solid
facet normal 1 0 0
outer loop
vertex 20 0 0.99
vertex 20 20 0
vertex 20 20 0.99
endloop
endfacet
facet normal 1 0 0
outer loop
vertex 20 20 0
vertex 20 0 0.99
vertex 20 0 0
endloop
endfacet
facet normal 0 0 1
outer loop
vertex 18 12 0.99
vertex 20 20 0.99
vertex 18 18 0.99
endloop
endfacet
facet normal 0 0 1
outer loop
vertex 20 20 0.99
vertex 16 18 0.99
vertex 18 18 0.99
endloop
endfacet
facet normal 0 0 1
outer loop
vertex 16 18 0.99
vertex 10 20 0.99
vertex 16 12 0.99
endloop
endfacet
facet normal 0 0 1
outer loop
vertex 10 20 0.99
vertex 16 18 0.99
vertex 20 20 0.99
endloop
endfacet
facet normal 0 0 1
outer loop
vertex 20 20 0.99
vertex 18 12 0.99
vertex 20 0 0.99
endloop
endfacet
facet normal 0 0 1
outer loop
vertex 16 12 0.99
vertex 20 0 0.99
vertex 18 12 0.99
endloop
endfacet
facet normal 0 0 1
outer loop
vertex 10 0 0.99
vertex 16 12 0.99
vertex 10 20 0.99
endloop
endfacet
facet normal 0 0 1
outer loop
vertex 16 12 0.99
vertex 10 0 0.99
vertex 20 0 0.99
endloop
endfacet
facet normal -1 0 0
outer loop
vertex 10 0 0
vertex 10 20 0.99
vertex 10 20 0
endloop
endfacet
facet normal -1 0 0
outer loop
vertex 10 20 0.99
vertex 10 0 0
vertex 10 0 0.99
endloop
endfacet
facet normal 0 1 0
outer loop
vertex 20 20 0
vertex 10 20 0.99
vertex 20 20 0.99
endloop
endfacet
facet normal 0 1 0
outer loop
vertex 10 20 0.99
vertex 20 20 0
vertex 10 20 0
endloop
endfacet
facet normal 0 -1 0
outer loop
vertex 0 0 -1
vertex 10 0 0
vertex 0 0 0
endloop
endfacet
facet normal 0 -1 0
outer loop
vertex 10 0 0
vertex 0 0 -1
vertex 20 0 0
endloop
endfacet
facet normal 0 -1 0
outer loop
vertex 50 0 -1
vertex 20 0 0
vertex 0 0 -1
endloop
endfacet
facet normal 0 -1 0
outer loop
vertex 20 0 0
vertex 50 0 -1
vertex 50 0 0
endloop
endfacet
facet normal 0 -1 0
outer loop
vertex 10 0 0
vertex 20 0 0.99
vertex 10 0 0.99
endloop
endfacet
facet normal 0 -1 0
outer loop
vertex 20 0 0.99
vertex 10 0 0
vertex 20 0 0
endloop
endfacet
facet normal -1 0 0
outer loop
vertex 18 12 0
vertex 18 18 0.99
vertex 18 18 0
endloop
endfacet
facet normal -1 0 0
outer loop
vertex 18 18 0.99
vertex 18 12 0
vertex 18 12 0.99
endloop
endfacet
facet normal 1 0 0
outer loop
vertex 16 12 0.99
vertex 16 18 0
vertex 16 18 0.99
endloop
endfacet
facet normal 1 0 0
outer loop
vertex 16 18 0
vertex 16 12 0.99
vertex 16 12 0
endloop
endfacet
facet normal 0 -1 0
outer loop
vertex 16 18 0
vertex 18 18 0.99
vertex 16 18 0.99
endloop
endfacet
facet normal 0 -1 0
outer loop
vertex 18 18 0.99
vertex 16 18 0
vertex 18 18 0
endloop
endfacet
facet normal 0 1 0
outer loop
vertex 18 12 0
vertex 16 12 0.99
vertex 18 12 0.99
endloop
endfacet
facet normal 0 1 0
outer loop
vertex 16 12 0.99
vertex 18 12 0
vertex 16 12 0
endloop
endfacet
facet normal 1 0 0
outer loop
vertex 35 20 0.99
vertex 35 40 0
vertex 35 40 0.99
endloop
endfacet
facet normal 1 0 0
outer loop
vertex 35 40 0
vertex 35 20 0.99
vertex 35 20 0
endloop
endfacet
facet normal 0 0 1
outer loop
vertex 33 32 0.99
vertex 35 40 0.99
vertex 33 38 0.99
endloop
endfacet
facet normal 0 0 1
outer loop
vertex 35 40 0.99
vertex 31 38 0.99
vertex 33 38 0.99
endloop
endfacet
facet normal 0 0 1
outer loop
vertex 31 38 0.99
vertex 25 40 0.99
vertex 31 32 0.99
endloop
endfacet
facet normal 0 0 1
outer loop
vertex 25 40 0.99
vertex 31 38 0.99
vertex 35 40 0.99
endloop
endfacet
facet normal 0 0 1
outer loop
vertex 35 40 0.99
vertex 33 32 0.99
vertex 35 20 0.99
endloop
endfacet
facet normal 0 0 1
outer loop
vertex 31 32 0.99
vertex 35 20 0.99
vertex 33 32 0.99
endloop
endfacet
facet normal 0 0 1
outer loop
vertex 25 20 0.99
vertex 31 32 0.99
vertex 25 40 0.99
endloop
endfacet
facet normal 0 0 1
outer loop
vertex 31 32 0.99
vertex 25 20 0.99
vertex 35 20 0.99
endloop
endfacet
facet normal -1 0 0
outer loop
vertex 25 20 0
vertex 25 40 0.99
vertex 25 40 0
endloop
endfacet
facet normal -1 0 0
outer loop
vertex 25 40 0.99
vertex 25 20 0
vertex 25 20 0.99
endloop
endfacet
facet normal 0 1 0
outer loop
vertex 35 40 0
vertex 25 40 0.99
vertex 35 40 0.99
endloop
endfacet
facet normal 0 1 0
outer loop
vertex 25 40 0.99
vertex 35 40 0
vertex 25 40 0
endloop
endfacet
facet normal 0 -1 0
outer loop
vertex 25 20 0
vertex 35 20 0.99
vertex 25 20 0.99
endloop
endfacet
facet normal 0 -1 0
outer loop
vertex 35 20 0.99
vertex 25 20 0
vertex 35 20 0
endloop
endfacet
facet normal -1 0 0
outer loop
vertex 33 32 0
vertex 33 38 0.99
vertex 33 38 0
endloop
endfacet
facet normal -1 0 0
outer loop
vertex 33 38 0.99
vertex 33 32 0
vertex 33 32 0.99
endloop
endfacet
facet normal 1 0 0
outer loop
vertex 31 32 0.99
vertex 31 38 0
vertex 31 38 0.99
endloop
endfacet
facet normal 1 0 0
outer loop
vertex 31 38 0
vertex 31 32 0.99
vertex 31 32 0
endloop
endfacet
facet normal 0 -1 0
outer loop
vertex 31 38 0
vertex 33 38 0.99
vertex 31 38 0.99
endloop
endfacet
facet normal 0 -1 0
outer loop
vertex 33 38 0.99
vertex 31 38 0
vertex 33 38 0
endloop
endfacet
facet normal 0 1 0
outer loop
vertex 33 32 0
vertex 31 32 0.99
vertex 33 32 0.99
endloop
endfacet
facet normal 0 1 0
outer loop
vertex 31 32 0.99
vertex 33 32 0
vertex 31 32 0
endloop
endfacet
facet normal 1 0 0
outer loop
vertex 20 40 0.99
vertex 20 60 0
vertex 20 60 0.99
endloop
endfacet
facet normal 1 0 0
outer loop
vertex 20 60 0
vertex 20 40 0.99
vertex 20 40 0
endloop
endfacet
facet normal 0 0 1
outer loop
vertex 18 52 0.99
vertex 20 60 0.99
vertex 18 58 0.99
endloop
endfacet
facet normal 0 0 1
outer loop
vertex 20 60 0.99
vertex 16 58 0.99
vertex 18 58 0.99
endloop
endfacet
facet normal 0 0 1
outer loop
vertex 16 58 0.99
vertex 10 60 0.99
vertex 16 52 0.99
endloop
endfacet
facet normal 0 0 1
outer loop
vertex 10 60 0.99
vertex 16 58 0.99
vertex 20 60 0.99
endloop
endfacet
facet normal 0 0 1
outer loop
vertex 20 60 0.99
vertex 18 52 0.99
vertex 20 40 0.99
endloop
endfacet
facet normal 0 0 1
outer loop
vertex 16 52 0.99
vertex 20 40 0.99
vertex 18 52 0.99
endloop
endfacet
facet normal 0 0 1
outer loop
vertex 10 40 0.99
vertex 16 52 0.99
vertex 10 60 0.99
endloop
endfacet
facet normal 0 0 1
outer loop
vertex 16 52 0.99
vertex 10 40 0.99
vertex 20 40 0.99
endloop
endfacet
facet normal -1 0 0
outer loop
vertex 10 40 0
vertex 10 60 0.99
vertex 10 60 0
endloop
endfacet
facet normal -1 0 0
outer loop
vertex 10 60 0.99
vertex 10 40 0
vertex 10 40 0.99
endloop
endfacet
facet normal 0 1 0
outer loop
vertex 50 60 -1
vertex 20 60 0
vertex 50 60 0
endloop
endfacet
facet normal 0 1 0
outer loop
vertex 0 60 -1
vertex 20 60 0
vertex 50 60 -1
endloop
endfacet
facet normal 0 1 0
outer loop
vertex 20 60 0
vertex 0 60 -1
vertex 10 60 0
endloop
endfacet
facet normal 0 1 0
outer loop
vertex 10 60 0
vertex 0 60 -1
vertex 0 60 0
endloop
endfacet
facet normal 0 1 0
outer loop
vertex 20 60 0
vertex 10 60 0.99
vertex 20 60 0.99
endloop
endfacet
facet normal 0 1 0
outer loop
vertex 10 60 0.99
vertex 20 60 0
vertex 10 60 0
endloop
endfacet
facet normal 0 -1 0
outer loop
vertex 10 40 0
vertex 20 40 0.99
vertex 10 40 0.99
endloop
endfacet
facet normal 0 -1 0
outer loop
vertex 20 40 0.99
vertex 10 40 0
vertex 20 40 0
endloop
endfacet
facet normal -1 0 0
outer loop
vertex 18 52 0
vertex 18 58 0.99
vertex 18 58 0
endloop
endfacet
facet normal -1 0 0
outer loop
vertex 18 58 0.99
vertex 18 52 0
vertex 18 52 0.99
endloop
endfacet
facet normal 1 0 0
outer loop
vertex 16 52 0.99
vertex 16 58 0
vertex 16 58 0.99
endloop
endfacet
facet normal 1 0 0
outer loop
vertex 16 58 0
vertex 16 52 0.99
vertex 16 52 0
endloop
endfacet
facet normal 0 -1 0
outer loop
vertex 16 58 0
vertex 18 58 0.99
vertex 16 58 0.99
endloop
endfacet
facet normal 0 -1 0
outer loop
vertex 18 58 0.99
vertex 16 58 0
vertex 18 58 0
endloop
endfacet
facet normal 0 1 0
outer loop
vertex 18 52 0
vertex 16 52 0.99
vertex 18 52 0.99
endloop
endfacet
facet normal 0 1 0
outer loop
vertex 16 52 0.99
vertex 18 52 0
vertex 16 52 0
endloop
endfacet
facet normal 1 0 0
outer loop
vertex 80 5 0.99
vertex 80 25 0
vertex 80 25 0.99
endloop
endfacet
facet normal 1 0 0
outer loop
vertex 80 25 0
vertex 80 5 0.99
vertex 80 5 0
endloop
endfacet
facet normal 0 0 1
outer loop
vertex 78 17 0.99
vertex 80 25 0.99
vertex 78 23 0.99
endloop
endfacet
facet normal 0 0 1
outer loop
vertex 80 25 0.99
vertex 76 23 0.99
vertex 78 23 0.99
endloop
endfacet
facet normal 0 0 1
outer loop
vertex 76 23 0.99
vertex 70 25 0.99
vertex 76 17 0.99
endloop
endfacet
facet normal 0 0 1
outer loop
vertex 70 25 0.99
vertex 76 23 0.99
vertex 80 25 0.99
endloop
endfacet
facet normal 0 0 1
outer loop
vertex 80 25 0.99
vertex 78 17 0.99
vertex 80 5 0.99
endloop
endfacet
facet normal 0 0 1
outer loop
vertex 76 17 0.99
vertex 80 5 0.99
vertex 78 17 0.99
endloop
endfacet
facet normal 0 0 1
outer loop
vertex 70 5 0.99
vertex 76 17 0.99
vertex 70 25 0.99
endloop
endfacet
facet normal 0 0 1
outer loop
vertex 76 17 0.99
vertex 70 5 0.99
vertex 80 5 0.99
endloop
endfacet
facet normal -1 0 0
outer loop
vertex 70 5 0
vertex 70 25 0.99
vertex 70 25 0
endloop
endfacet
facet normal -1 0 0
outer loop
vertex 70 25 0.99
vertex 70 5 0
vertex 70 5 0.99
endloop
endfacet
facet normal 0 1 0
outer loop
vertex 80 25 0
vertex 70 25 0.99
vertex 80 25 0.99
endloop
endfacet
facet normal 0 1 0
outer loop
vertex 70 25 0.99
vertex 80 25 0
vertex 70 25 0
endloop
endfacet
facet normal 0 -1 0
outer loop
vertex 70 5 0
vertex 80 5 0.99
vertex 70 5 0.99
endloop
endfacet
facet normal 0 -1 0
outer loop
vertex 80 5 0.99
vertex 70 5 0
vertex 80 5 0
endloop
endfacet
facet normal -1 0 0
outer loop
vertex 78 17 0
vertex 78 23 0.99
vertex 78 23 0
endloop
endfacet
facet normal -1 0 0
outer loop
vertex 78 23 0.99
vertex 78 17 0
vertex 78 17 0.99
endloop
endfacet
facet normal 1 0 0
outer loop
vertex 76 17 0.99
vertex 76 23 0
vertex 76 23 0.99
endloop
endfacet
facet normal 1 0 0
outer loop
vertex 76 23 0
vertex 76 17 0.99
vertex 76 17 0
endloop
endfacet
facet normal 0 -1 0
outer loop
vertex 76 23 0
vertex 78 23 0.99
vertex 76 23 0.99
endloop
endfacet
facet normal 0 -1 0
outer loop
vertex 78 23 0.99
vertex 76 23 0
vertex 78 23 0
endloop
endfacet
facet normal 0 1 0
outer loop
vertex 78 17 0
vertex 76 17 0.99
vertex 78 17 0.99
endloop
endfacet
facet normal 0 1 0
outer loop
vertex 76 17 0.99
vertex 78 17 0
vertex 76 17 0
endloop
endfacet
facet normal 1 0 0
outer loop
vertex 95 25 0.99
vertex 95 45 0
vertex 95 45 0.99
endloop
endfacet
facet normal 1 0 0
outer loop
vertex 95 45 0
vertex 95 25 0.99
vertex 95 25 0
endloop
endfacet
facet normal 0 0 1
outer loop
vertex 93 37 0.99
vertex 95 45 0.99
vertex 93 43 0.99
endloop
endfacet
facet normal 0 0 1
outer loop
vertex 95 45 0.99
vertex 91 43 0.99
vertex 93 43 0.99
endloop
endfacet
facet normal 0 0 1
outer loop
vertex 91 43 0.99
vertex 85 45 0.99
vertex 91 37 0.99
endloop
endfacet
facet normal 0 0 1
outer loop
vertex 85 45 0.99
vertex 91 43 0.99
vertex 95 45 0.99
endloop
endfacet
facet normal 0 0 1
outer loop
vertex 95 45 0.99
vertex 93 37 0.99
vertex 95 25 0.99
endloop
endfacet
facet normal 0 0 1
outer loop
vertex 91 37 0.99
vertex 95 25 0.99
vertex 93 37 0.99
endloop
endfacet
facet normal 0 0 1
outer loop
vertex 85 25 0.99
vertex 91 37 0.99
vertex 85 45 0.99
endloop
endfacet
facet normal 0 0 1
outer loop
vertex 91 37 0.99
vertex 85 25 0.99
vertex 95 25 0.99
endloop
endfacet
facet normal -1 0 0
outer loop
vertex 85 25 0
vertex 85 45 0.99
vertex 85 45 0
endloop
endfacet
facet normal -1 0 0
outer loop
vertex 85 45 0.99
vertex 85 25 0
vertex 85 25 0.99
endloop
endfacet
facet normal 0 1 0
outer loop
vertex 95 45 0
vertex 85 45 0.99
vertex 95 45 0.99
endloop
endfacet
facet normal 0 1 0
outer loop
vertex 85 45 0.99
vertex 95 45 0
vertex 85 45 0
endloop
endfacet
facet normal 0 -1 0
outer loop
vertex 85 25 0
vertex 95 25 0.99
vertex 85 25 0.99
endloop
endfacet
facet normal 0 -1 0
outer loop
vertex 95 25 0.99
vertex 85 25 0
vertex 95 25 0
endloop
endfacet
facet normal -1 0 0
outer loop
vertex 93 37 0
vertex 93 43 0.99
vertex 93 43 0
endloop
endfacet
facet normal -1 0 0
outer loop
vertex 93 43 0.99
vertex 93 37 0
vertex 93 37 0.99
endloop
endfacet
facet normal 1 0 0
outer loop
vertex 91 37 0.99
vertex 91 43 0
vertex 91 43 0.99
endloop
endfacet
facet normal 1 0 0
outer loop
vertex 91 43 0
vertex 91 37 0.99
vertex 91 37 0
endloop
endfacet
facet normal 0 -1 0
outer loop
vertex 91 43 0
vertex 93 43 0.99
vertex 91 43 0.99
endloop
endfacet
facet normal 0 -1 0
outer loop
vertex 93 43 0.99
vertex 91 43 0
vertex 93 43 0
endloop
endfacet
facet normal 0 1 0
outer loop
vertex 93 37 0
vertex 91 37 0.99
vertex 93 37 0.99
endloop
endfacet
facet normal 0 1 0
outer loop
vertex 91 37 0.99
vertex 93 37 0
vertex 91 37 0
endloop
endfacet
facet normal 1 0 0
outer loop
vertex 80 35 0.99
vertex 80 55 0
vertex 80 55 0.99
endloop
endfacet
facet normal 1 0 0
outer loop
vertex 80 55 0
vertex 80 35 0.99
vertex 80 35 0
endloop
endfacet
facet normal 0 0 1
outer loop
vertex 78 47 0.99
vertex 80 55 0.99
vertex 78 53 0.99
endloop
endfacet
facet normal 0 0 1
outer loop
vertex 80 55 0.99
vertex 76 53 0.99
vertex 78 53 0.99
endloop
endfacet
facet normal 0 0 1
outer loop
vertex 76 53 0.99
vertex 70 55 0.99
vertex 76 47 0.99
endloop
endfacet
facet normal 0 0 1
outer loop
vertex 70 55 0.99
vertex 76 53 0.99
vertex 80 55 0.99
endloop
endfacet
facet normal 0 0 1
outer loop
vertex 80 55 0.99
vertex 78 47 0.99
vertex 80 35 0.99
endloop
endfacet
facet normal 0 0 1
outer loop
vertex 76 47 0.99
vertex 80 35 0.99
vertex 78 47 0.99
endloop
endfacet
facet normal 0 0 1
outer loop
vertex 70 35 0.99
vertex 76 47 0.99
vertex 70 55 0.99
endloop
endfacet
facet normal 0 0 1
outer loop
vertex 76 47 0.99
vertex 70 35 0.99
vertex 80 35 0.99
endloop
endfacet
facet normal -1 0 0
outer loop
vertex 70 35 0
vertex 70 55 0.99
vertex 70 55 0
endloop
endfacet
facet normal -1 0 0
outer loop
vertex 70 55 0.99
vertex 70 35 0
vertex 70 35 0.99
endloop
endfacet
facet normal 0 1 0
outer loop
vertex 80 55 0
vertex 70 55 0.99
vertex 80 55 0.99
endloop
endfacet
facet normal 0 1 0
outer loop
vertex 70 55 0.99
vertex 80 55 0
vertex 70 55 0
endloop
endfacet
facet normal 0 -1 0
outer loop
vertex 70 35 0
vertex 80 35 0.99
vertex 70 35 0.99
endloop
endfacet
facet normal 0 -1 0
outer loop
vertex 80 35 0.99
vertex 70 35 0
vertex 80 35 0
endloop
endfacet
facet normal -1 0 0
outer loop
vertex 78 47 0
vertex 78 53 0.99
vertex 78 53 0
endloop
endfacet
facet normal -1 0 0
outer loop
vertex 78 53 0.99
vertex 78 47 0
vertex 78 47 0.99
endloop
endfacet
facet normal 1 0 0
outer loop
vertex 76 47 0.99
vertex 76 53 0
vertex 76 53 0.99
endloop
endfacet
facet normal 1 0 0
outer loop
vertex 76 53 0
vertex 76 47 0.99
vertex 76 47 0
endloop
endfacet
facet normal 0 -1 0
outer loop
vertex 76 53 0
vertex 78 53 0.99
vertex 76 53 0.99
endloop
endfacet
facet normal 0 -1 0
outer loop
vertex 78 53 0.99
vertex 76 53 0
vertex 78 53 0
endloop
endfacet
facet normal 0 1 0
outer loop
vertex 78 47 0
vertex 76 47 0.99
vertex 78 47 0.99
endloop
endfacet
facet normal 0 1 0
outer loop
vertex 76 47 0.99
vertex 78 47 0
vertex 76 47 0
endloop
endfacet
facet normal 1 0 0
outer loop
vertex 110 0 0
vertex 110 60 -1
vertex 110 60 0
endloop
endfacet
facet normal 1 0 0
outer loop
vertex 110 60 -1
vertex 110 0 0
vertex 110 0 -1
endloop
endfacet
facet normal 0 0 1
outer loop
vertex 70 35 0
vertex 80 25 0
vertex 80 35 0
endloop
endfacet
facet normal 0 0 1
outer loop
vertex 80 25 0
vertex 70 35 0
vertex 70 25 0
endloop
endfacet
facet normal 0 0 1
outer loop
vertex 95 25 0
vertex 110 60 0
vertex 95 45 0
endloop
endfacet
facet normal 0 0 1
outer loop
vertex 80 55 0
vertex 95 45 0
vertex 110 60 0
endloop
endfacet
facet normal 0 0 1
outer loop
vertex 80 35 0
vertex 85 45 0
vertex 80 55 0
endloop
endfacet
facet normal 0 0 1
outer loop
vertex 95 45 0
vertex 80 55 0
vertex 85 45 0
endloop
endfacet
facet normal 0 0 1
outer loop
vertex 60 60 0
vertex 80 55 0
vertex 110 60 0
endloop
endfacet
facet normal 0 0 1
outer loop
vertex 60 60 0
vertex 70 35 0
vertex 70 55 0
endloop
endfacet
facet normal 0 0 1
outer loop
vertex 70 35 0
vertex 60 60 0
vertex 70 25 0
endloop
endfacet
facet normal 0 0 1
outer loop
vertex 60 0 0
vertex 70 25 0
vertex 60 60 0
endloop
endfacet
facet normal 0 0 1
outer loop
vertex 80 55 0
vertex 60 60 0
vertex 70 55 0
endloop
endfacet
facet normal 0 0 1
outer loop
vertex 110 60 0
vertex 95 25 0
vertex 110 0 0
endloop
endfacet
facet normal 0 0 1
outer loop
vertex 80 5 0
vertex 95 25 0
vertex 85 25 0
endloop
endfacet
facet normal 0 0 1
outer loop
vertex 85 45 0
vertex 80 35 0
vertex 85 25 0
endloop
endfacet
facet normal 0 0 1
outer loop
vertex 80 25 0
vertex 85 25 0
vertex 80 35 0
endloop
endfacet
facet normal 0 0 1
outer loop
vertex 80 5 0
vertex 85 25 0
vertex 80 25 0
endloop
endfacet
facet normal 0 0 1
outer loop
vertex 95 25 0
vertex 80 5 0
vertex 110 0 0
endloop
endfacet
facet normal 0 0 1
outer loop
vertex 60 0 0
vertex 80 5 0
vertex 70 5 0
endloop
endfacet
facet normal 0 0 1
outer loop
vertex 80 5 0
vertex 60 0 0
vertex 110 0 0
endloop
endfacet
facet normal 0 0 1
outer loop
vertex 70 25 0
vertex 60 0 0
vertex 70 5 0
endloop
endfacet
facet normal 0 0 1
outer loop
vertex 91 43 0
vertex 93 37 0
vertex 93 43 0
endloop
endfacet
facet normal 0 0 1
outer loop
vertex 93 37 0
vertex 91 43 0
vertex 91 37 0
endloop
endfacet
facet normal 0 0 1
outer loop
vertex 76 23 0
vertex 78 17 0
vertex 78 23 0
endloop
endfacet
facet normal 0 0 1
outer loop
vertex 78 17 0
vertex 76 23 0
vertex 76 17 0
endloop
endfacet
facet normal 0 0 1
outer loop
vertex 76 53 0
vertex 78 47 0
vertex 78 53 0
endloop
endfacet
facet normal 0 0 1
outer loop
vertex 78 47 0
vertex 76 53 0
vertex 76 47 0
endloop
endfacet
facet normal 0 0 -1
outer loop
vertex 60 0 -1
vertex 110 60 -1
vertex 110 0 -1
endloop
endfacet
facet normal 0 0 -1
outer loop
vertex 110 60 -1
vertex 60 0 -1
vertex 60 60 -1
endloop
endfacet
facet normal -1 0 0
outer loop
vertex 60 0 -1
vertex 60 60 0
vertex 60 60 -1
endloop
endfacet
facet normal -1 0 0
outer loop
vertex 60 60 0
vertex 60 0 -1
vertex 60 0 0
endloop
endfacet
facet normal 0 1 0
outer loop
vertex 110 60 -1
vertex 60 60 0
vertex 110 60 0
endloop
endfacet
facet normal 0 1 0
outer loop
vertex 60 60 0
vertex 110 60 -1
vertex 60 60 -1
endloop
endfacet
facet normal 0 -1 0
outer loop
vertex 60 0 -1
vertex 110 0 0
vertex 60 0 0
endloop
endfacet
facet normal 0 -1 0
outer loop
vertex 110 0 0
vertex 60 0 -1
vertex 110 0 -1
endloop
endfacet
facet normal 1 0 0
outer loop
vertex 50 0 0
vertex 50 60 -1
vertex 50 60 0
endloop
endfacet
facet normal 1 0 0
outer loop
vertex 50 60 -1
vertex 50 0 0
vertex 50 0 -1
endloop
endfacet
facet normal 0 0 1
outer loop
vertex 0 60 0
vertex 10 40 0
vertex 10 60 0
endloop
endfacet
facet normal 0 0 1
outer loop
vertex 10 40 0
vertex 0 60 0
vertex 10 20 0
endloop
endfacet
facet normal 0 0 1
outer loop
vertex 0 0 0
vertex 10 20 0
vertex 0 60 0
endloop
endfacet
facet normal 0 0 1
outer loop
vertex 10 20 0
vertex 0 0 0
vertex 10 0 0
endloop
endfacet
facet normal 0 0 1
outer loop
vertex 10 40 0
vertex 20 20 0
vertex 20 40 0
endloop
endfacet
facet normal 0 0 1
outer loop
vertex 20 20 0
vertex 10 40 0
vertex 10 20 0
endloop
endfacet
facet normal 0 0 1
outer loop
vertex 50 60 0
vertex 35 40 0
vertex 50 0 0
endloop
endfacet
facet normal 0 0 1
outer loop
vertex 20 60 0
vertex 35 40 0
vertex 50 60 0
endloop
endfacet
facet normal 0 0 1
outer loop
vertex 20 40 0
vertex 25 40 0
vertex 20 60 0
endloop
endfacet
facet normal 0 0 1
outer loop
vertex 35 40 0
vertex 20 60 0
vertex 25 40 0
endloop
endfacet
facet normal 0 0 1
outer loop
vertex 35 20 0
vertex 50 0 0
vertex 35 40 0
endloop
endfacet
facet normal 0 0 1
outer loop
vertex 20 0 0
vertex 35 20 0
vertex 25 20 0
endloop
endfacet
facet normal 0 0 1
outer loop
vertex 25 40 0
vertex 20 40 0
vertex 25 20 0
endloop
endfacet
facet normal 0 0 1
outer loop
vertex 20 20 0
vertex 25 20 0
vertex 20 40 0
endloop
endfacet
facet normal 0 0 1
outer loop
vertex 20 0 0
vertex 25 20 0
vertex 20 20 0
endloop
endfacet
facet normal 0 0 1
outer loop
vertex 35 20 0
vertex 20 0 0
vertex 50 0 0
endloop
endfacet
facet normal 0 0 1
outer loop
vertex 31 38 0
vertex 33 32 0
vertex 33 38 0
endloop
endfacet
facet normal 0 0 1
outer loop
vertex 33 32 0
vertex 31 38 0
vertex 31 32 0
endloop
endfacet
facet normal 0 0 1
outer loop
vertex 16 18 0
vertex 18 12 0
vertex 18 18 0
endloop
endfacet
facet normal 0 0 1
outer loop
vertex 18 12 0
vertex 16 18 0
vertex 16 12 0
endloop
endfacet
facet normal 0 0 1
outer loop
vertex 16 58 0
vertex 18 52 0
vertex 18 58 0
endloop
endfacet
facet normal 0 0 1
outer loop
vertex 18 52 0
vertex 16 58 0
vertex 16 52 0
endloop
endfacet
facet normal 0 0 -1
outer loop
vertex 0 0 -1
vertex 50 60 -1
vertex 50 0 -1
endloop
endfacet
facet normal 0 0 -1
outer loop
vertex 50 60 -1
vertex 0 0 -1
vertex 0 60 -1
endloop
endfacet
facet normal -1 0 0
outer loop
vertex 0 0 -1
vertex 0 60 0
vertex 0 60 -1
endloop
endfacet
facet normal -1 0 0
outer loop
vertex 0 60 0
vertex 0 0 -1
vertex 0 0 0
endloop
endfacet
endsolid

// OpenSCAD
// file: ../TestHelper.scad
// Fischertechnik Box Foundation
// Test Helper

function getPlacementBaseSpace() = [50,60];
function getCubeSpace() = [10,20];

module PlacementBase() {
    color("green")
    translate([0, 0, -1])
        cube([getPlacementBaseSpace().x, getPlacementBaseSpace().y, 1]);
}

module Cube() {
    translate([0,0,-.01])
    difference() {
        cube([getCubeSpace().x,getCubeSpace().y,1]);
        translate([getCubeSpace().x*0.6, getCubeSpace().y*0.6, -1])
            cube([getCubeSpace().x*0.2,getCubeSpace().y*0.3,3]);
    }
}

module Deploy(distance=30) {
    for( i = [0:1:$children-1])
        translate([i*distance, 0])
            children(i);
}
// file: ../../Base/PlacementOptions.scad
// Fischertechnik Box Foundation
// Placement Options

// Alignment
NoAlign = 0;
AlignLeft = 1;
AlignBottom = 2;
AlignCenter = 3;
AlignRight = 4;
AlignTop = 5;

// Element rotation degree steps
rotations = [0, -90, -180, -270];

// Rotation
NoRotation = 0;
Rotate0 = 0;
Rotate90 = 1;
Rotate180 = 2;
Rotate270 = 3;

// Docking (seen from above)
NoDock = -1;
DockLeft = 0;
DockTop = 1;
DockRight = 2;
DockCorner = 2;
DockBottom = 3;

// Web corners
LowerLeft = 0;
UpperLeft = 1;
UpperRight = 2;
LowerRight = 3;

// Web position relative to corner
LeftOfCorner = 0;
RightOfCorner = 1;
// file: ../../Base/Alignment.scad
// Fischertechnik Box Foundation
// Geometry Helpers Alignment

include <PlacementOptions.scad>

// getAlignedX(elementWidth, spaceWidth, align=AlignRight, offset=0)
// Gets the aligned X offset of an element with the given
// width in the given space.
// elementWidth = The width of the element to positon
// spaceWidth = The space where the element should be aligned
// align = 0 AlignLeft, 1 AlignCenter, 2 AlignRight
// offset = an optional offset from the aligned position. When
// aligned left or centered, then positive values are in X direction.
// When aligned right then positive values are in negative X direction.

function getAlignedX(elementWidth, spaceWidth, align=AlignRight, offset=0) =
    (align == AlignLeft) ?
        offset :
        ((align == AlignCenter) ?
        (spaceWidth - elementWidth)/2 + offset :
        spaceWidth - offset - elementWidth);

// getAlignedY(elementDepth, spaceDepth, align=AlignTop, offset=0)
// Gets the aligned Y offset of an element with the given
// depth in the given space.
// elementDepth = The depth of the element to positon
// spaceDepth = The space where the element should be aligned
// align = 0 AlignBottom, 1 AlignCenter, 2 AlignTop
// offset = an optional offset from the aligned position. When
// aligned bottom or centered, then positive values are in Y direction.
// When aligned top then positive values are in negative Y direction.

function getAlignedY(elementDepth, spaceDepth, align=AlignTop, offset=0) =
    (align == AlignBottom) ?
        offset :
        ((align == AlignCenter) ?
        (spaceDepth - elementDepth)/2 + offset :
        spaceDepth - offset - elementDepth);
// main file
// Fischertechnik Box Foundation
// Geometry Helpers Alignment
// Test getAlignedY

use <../../Base/Alignment.scad>

include <../../Base/PlacementOptions.scad>

use <../TestHelper.scad>

PlacementBase();
bottomOffset = getAlignedY(getCubeSpace().y, getPlacementBaseSpace().y, AlignBottom);
translate([10, bottomOffset, 0])
    Cube();

centerOffset = getAlignedY(getCubeSpace().y, getPlacementBaseSpace().y, AlignCenter);
translate([25, centerOffset, 0])
    Cube();

topOffset = getAlignedX(getCubeSpace().y, getPlacementBaseSpace().y, AlignTop);
translate([10, topOffset, 0])
    Cube();

translate([getPlacementBaseSpace().x + 10, 0, 0]) {
    PlacementBase();    
    bottomWithOffset = getAlignedY(getCubeSpace().y, getPlacementBaseSpace().y, AlignBottom, 5);
    translate([10, bottomWithOffset, 0])
        Cube();

    centerWithOffset = getAlignedY(getCubeSpace().y, getPlacementBaseSpace().y, AlignCenter, 5);
    translate([25, centerWithOffset, 0])
        Cube();

    topWithOffset = getAlignedX(getCubeSpace().y, getPlacementBaseSpace().y, AlignTop, 5);
    translate([10, topWithOffset, 0])
        Cube();    
}
